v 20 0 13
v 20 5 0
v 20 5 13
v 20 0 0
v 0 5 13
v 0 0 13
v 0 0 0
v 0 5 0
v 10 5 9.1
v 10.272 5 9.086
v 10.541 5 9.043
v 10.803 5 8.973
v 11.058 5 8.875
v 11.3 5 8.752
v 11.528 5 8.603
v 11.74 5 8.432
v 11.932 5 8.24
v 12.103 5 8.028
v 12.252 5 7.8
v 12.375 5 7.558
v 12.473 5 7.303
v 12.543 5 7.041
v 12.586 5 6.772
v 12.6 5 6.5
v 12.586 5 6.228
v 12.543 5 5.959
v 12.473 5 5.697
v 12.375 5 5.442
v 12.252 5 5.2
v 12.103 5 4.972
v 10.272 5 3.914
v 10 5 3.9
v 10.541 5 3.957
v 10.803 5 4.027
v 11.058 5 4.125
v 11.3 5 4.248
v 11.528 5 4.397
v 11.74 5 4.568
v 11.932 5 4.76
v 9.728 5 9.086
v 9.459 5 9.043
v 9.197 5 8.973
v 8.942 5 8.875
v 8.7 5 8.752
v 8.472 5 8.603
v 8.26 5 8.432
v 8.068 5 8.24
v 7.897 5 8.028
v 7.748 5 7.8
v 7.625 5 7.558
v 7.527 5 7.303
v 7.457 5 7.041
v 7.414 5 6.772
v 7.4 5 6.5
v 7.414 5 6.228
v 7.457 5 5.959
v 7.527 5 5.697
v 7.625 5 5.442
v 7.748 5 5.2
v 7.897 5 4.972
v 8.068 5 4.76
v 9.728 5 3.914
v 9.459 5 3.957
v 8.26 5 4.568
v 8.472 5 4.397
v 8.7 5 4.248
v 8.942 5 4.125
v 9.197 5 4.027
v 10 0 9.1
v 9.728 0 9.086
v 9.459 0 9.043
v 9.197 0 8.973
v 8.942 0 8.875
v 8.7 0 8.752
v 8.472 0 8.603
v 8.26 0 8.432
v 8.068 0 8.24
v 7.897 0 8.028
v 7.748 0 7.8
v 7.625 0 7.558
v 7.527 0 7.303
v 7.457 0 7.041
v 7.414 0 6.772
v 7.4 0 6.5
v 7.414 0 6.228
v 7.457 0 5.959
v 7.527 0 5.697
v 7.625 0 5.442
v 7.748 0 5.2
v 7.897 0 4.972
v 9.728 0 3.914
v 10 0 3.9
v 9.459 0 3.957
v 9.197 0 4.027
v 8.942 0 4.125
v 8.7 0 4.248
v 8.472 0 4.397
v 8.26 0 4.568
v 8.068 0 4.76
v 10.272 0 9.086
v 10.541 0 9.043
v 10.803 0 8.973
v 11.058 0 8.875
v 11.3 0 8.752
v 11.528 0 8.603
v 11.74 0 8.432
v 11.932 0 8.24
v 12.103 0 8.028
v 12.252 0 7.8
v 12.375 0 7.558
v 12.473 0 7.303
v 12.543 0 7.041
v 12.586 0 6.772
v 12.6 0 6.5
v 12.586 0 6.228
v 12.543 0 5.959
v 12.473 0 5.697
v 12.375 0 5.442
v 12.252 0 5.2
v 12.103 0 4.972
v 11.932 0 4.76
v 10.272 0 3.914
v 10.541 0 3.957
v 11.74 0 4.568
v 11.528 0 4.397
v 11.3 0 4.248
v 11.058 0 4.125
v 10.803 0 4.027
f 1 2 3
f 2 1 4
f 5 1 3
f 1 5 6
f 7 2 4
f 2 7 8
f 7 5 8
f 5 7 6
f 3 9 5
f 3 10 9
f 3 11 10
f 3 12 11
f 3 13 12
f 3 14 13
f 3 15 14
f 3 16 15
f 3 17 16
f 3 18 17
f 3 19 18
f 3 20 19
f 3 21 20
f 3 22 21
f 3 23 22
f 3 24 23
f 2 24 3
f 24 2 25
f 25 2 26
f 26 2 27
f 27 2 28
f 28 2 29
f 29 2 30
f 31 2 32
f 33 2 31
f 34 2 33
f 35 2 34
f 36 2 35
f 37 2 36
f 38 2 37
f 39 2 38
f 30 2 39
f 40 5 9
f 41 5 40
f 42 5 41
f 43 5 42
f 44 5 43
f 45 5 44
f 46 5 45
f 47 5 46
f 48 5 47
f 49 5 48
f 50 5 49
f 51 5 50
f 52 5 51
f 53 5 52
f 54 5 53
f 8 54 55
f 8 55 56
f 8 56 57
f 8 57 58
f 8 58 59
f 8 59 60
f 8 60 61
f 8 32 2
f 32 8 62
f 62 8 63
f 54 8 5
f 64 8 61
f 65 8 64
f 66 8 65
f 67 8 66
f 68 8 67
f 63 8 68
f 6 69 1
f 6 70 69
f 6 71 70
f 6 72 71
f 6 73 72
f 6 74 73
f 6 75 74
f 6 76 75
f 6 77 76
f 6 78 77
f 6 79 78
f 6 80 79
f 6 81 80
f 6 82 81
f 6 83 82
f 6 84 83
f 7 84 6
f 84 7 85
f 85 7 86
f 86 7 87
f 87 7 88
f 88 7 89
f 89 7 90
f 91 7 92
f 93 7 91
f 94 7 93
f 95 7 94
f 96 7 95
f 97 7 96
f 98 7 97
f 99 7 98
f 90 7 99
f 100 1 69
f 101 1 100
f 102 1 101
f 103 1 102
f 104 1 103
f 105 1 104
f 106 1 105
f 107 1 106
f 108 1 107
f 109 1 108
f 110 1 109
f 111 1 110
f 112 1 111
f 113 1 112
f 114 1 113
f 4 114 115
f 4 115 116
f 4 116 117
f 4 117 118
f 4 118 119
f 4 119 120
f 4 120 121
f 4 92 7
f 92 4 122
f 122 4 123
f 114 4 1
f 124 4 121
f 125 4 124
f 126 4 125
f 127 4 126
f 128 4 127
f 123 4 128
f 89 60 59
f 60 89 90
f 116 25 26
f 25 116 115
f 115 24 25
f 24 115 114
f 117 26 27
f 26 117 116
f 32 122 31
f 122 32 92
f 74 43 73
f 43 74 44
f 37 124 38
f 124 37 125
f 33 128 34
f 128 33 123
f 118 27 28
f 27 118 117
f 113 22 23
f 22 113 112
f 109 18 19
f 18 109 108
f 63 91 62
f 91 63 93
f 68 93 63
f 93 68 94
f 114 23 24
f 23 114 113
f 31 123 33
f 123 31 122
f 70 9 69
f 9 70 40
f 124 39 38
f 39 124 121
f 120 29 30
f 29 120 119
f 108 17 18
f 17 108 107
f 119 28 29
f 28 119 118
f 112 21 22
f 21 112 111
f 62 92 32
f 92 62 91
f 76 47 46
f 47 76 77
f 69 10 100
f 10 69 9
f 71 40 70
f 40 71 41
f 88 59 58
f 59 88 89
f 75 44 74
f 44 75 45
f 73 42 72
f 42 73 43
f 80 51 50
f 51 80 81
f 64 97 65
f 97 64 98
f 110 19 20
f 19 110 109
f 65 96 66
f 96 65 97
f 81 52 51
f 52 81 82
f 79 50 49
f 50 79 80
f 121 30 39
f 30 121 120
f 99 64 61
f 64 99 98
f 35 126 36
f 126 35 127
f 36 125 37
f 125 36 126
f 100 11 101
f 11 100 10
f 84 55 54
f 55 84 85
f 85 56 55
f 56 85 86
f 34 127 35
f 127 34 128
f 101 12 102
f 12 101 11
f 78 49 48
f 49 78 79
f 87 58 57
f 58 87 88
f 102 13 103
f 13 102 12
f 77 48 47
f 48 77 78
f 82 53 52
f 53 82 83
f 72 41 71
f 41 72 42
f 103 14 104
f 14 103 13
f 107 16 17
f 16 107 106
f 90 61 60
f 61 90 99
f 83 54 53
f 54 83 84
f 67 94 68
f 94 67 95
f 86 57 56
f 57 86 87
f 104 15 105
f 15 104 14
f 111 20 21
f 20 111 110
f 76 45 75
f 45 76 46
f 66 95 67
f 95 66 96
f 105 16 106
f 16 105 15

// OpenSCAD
//distance check x_end top

$fn=60;

difference(){
cube([20, 5, 13]);
//translate([10, -1, 13/2]) rotate([90, 0, 0]) cylinder(d=9.50, h=5);
translate([10, -1, 13/2]) rotate([-90, 0, 0]) cylinder(d=5.2, h=7);
}
